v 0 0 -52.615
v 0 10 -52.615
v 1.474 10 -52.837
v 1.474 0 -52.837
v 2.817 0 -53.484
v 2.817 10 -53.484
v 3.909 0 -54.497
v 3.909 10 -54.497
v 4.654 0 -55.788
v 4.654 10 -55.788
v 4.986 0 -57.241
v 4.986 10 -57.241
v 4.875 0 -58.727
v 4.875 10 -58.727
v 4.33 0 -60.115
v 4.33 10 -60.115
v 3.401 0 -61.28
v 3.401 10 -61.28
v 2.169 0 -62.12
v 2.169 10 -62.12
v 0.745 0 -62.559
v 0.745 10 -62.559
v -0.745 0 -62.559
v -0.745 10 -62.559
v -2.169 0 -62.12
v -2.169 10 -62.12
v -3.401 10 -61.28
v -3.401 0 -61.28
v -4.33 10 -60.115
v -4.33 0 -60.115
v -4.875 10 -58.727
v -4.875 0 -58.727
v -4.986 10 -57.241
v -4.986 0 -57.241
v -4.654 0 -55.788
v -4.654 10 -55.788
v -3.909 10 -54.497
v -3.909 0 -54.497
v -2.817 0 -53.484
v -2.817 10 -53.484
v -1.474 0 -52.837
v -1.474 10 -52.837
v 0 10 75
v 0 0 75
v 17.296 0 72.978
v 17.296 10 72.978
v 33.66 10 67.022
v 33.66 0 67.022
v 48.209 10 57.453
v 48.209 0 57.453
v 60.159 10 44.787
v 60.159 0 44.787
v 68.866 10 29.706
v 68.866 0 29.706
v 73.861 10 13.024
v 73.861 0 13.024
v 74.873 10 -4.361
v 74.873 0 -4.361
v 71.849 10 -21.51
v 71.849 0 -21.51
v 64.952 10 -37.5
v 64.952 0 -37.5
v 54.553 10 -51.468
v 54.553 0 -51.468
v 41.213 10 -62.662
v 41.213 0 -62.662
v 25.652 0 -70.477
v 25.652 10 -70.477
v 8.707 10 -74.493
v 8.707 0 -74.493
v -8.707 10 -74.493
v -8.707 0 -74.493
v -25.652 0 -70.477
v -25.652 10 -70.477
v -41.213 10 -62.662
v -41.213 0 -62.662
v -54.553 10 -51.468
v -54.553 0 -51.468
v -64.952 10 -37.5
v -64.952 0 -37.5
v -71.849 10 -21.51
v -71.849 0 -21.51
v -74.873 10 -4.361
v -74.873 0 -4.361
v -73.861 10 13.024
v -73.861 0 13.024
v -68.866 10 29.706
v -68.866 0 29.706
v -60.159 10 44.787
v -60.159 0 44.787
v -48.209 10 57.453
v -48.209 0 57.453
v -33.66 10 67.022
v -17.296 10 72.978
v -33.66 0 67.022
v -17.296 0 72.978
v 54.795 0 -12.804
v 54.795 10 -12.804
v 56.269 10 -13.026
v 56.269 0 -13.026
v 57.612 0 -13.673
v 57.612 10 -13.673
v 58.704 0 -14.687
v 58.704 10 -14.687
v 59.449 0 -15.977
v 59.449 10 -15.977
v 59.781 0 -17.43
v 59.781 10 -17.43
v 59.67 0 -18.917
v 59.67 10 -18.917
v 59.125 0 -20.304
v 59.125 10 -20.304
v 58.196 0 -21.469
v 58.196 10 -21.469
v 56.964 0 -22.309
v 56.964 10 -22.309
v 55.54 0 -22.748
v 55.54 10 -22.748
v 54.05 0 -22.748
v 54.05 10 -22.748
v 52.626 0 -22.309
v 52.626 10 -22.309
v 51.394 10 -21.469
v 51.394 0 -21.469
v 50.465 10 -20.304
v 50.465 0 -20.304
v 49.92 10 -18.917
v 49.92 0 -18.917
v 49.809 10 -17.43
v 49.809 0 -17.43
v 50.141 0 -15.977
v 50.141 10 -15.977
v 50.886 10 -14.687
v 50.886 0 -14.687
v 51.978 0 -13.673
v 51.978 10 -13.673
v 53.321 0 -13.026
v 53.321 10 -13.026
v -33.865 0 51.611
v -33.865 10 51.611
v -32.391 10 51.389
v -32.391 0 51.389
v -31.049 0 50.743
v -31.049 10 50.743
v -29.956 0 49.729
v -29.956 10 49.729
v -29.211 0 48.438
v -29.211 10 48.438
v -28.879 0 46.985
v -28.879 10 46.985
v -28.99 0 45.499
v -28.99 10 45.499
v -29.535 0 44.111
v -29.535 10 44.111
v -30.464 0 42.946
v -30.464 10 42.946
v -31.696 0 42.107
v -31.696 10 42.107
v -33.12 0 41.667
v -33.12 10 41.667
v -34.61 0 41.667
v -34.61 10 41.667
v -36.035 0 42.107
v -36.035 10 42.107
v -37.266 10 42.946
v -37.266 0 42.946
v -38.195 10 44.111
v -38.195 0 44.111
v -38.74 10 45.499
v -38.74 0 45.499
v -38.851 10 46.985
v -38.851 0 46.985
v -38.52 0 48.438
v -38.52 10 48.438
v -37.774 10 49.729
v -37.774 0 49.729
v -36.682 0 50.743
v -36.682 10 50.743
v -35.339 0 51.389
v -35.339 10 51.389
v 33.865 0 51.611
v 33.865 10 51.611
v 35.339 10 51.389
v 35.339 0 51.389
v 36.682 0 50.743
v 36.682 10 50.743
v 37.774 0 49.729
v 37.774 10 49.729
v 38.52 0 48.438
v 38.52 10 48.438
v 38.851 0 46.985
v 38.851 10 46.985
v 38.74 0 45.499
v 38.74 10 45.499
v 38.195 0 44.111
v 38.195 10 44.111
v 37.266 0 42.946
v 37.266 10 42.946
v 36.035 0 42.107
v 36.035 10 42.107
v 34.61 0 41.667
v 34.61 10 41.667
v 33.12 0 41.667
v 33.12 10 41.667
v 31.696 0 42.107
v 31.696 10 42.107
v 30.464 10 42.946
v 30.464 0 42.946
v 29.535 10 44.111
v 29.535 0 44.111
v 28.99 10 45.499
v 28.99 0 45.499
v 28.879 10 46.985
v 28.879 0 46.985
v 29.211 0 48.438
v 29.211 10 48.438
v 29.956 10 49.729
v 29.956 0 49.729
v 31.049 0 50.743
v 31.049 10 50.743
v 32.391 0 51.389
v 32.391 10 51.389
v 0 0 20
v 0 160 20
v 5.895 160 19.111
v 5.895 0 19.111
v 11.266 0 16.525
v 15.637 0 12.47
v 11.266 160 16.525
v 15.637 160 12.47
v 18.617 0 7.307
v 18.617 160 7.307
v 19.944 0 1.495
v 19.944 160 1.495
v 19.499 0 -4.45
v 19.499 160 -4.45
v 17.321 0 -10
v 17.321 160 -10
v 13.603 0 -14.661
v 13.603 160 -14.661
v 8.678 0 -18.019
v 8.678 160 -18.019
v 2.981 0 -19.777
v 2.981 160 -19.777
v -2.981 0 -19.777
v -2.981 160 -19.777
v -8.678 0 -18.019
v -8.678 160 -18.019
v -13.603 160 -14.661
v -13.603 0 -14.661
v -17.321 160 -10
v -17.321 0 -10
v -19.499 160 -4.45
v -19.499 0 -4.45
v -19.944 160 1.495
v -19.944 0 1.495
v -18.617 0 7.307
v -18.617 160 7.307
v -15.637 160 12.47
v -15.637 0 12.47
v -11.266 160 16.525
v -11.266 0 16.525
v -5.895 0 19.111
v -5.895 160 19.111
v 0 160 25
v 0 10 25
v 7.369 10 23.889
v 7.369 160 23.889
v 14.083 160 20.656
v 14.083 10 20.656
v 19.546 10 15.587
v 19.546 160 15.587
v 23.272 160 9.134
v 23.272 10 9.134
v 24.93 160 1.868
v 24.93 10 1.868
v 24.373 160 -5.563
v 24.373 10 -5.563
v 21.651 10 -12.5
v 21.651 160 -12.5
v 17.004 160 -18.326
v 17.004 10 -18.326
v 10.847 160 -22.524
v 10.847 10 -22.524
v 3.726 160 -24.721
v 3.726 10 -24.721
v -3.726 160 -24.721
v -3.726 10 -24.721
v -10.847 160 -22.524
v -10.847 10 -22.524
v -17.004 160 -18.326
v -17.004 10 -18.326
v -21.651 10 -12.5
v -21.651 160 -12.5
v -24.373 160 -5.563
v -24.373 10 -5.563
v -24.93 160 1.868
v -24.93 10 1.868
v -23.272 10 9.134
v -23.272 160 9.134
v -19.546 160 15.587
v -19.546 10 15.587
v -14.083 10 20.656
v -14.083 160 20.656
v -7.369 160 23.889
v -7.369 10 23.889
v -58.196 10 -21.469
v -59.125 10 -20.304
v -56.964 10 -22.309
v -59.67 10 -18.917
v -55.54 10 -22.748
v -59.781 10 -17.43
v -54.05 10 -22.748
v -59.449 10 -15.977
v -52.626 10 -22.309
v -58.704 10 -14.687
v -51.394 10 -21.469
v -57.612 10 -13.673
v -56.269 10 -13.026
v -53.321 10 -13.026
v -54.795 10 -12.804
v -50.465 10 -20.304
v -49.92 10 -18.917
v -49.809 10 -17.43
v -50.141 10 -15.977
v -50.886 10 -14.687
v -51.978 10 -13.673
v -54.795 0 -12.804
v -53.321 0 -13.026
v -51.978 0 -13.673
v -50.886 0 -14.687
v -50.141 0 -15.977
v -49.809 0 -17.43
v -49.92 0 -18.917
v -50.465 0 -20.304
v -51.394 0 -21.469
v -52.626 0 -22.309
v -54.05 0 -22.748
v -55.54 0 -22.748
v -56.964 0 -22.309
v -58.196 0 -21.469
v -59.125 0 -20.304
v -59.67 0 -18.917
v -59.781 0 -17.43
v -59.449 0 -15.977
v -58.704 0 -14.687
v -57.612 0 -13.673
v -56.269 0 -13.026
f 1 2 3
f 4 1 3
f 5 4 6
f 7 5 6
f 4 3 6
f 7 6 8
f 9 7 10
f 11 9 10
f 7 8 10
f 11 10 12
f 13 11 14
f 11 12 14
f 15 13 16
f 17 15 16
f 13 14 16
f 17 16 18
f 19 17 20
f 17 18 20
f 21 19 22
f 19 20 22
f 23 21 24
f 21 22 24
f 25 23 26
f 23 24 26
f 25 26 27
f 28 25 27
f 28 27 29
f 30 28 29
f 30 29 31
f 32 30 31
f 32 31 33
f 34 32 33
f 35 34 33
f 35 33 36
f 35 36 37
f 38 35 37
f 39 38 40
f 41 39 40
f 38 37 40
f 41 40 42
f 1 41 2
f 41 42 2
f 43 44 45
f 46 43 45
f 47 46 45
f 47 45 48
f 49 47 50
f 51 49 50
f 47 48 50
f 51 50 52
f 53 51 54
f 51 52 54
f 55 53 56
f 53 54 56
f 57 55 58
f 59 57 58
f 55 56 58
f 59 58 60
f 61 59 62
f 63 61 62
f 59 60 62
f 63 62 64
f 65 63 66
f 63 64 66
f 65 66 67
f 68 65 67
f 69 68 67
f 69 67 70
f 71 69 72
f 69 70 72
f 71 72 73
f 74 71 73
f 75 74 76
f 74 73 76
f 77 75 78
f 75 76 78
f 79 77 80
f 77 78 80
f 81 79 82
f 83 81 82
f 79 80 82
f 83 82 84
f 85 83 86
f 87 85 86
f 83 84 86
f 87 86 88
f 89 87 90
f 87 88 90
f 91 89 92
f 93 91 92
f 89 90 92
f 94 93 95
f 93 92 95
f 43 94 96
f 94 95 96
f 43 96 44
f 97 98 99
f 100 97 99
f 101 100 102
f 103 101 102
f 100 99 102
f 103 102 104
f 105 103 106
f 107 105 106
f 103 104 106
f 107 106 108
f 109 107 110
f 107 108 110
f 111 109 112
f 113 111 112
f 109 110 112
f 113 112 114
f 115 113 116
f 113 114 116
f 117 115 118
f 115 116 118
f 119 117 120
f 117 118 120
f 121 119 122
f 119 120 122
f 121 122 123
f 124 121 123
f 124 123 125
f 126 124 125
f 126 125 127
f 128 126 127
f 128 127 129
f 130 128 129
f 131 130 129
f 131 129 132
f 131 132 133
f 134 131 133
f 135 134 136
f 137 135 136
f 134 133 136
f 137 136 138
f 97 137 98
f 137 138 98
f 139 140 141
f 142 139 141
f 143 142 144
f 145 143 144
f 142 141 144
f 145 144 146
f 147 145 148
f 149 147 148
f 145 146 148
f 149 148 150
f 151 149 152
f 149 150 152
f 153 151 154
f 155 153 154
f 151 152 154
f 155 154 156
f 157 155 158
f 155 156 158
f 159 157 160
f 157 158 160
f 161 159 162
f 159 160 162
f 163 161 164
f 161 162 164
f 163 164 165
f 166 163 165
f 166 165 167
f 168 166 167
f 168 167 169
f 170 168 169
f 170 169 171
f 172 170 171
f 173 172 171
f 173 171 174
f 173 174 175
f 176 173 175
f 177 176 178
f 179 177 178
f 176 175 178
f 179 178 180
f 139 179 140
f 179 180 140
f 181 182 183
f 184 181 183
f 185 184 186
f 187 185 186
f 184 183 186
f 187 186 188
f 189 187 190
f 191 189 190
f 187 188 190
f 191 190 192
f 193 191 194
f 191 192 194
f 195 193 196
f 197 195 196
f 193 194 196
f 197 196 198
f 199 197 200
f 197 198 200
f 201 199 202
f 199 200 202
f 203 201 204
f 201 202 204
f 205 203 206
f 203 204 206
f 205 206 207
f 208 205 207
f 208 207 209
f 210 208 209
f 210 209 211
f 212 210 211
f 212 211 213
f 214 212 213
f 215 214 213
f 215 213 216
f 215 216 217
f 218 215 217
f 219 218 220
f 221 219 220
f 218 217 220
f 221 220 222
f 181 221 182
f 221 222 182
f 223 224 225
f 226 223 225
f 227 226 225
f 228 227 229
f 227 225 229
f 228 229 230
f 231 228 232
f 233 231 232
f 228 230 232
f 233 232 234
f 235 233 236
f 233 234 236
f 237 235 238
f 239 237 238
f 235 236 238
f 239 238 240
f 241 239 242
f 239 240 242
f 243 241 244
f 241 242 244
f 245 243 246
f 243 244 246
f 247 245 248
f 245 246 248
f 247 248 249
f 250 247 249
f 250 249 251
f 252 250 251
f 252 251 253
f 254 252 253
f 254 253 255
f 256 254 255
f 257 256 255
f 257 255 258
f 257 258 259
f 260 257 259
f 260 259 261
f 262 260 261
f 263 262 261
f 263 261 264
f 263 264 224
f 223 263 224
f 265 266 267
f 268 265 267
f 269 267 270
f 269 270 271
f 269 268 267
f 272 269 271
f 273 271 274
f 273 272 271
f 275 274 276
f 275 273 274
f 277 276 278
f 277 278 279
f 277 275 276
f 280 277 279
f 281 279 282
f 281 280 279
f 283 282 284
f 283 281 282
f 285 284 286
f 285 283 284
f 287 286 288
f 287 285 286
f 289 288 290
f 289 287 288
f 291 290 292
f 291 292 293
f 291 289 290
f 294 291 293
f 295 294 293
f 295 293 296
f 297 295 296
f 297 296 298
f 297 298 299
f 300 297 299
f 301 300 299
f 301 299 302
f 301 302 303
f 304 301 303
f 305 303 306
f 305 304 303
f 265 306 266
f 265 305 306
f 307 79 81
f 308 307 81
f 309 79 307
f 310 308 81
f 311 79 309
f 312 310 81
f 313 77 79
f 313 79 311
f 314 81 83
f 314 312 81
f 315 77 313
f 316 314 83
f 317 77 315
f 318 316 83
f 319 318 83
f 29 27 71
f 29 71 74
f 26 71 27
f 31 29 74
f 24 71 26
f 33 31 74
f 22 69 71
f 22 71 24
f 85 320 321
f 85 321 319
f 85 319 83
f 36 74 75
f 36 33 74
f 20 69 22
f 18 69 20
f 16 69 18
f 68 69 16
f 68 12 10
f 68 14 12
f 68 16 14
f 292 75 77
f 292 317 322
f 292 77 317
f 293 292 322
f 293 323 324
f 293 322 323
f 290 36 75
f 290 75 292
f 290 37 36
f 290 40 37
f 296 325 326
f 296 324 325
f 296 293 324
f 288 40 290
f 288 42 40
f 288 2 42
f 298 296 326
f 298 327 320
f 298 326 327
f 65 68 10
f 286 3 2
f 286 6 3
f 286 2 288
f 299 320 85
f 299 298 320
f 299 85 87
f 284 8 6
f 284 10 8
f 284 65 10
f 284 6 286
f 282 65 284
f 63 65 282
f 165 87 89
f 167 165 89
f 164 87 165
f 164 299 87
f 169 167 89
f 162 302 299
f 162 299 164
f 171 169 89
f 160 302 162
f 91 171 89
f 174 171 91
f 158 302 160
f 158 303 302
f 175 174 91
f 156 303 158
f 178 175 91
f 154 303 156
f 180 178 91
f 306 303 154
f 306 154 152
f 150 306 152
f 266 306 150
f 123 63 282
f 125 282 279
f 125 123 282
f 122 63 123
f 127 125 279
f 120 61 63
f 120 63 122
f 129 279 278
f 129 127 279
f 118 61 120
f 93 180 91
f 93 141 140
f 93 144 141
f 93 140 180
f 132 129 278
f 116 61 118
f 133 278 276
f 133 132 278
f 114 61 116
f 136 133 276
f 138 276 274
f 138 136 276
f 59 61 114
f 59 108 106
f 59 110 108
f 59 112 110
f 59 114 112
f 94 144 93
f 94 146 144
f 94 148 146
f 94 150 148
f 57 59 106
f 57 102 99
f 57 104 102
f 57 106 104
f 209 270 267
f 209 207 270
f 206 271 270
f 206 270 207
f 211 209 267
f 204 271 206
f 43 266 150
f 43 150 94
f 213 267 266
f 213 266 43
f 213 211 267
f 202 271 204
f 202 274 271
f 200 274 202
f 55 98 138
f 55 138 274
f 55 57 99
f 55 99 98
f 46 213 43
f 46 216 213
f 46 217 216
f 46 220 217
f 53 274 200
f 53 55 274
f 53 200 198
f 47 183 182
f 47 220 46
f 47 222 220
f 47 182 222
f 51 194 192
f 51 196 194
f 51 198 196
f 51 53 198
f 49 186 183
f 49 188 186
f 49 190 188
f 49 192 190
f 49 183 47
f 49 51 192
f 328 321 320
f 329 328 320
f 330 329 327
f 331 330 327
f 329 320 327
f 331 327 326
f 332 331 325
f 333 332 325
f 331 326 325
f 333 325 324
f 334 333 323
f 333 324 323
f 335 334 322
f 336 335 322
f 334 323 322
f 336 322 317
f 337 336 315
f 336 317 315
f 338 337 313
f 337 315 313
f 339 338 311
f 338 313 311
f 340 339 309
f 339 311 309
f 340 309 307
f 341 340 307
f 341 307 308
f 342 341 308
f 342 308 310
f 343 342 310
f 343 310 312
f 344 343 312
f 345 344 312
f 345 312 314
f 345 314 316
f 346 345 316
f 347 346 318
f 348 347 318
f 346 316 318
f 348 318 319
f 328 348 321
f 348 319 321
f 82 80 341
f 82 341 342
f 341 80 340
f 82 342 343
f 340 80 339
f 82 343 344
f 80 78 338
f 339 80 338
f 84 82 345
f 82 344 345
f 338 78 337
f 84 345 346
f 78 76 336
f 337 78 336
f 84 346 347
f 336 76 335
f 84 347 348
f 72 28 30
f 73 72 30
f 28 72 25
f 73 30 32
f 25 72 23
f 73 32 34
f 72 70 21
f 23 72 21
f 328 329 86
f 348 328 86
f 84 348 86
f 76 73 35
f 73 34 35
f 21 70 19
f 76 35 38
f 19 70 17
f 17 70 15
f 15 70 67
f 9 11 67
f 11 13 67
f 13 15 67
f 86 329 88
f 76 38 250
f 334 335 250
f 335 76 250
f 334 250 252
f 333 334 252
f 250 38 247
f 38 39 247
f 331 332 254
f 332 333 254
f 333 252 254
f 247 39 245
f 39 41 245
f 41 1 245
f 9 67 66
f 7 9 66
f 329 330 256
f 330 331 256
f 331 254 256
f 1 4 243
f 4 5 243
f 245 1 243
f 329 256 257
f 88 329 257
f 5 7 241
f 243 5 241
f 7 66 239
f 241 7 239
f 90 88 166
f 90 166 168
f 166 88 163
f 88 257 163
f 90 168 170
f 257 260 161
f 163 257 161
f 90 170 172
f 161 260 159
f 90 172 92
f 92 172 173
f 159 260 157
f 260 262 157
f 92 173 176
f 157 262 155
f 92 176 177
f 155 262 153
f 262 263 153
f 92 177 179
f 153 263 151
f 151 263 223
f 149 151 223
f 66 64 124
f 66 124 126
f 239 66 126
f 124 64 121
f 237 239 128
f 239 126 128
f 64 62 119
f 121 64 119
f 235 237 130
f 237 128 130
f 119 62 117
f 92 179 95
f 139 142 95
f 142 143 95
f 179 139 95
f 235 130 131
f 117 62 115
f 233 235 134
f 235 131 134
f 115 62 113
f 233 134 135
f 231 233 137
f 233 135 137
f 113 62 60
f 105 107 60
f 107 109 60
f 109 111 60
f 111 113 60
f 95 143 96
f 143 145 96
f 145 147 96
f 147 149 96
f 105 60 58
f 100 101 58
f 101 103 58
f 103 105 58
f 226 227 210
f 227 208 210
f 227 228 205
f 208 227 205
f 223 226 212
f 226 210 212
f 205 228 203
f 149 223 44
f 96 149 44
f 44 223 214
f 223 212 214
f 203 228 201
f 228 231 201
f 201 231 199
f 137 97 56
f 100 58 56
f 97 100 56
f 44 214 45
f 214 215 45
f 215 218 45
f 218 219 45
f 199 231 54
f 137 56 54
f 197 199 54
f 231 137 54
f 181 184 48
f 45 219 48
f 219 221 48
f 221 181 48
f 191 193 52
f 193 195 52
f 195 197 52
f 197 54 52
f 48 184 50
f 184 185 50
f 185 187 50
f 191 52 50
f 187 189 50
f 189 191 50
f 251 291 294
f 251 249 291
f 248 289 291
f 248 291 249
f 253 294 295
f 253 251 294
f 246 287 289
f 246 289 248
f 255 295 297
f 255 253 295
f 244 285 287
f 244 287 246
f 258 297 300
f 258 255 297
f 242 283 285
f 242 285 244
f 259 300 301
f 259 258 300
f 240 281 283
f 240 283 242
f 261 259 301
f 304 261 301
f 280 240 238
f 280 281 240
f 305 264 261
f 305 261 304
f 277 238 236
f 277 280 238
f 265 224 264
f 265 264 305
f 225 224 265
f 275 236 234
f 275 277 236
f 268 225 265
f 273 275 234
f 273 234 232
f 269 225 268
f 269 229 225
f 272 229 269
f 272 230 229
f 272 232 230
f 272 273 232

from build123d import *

# Parameters (mm, degrees)
SKETCH1_R           = 75
BOSS_EXTRUDE1_DEPTH = 10
SKETCH2_R           = 5
CUT_EXTRUDE1_DEPTH  = 10
SKETCH3_R           = 20
CUT_EXTRUDE2_DEPTH  = 10
BOSS_EXTRUDE2_START = 150
SKETCH4_R           = 25
SKETCH4_R_2         = 20
BOSS_EXTRUDE2_DEPTH = 150


with BuildPart() as part:
    # Sketch1 → Boss-Extrude1 (new body)
    with BuildSketch(Plane(origin=(0, 0, 0), x_dir=(1, 0, 0), z_dir=(0, 1, 0))):
        with Locations(Location((0, 0, 0), (0, 0, 270))):
            Circle(SKETCH1_R)
    extrude(amount=BOSS_EXTRUDE1_DEPTH)

    # Sketch2 → Cut-Extrude1 (cut)
    with BuildSketch(Plane(origin=(0, 10, 0), x_dir=(1, 0, 0), z_dir=(0, 1, 0))):
        with Locations(Location((0, 57.614814887, 0), (0, 0, 270))):
            Circle(SKETCH2_R)
        with Locations(Location((54.794945134, 17.803956928, 0), (0, 0, 270))):
            Circle(SKETCH2_R)
        with Locations(Location((33.865138504, -46.611364372, 0), (0, 0, 270))):
            Circle(SKETCH2_R)
        with Locations(Location((-33.865138504, -46.611364372, 0), (0, 0, 270))):
            Circle(SKETCH2_R)
        with Locations(Location((-54.794945134, 17.803956928, 0), (0, 0, 270))):
            Circle(SKETCH2_R)
    extrude(amount=-CUT_EXTRUDE1_DEPTH, mode=Mode.SUBTRACT)

    # Sketch3 → Cut-Extrude2 (cut)
    with BuildSketch(Plane(origin=(0, 10, 0), x_dir=(1, 0, 0), z_dir=(0, 1, 0))):
        with Locations(Location((0, 0, 0), (0, 0, 270))):
            Circle(SKETCH3_R)
    extrude(amount=-CUT_EXTRUDE2_DEPTH, mode=Mode.SUBTRACT)

    # Sketch4 → Boss-Extrude2 (add)
    with BuildSketch(Plane(origin=(0, 10, 0), x_dir=(1, 0, 0), z_dir=(0, 1, 0)).offset(BOSS_EXTRUDE2_START)):
        with Locations(Location((0, 0, 0), (0, 0, 270))):
            Circle(SKETCH4_R)
        with Locations(Location((0, 0, 0), (0, 0, 270))):
            Circle(SKETCH4_R_2, mode=Mode.SUBTRACT)
    extrude(amount=-BOSS_EXTRUDE2_DEPTH)


solid = part.part
